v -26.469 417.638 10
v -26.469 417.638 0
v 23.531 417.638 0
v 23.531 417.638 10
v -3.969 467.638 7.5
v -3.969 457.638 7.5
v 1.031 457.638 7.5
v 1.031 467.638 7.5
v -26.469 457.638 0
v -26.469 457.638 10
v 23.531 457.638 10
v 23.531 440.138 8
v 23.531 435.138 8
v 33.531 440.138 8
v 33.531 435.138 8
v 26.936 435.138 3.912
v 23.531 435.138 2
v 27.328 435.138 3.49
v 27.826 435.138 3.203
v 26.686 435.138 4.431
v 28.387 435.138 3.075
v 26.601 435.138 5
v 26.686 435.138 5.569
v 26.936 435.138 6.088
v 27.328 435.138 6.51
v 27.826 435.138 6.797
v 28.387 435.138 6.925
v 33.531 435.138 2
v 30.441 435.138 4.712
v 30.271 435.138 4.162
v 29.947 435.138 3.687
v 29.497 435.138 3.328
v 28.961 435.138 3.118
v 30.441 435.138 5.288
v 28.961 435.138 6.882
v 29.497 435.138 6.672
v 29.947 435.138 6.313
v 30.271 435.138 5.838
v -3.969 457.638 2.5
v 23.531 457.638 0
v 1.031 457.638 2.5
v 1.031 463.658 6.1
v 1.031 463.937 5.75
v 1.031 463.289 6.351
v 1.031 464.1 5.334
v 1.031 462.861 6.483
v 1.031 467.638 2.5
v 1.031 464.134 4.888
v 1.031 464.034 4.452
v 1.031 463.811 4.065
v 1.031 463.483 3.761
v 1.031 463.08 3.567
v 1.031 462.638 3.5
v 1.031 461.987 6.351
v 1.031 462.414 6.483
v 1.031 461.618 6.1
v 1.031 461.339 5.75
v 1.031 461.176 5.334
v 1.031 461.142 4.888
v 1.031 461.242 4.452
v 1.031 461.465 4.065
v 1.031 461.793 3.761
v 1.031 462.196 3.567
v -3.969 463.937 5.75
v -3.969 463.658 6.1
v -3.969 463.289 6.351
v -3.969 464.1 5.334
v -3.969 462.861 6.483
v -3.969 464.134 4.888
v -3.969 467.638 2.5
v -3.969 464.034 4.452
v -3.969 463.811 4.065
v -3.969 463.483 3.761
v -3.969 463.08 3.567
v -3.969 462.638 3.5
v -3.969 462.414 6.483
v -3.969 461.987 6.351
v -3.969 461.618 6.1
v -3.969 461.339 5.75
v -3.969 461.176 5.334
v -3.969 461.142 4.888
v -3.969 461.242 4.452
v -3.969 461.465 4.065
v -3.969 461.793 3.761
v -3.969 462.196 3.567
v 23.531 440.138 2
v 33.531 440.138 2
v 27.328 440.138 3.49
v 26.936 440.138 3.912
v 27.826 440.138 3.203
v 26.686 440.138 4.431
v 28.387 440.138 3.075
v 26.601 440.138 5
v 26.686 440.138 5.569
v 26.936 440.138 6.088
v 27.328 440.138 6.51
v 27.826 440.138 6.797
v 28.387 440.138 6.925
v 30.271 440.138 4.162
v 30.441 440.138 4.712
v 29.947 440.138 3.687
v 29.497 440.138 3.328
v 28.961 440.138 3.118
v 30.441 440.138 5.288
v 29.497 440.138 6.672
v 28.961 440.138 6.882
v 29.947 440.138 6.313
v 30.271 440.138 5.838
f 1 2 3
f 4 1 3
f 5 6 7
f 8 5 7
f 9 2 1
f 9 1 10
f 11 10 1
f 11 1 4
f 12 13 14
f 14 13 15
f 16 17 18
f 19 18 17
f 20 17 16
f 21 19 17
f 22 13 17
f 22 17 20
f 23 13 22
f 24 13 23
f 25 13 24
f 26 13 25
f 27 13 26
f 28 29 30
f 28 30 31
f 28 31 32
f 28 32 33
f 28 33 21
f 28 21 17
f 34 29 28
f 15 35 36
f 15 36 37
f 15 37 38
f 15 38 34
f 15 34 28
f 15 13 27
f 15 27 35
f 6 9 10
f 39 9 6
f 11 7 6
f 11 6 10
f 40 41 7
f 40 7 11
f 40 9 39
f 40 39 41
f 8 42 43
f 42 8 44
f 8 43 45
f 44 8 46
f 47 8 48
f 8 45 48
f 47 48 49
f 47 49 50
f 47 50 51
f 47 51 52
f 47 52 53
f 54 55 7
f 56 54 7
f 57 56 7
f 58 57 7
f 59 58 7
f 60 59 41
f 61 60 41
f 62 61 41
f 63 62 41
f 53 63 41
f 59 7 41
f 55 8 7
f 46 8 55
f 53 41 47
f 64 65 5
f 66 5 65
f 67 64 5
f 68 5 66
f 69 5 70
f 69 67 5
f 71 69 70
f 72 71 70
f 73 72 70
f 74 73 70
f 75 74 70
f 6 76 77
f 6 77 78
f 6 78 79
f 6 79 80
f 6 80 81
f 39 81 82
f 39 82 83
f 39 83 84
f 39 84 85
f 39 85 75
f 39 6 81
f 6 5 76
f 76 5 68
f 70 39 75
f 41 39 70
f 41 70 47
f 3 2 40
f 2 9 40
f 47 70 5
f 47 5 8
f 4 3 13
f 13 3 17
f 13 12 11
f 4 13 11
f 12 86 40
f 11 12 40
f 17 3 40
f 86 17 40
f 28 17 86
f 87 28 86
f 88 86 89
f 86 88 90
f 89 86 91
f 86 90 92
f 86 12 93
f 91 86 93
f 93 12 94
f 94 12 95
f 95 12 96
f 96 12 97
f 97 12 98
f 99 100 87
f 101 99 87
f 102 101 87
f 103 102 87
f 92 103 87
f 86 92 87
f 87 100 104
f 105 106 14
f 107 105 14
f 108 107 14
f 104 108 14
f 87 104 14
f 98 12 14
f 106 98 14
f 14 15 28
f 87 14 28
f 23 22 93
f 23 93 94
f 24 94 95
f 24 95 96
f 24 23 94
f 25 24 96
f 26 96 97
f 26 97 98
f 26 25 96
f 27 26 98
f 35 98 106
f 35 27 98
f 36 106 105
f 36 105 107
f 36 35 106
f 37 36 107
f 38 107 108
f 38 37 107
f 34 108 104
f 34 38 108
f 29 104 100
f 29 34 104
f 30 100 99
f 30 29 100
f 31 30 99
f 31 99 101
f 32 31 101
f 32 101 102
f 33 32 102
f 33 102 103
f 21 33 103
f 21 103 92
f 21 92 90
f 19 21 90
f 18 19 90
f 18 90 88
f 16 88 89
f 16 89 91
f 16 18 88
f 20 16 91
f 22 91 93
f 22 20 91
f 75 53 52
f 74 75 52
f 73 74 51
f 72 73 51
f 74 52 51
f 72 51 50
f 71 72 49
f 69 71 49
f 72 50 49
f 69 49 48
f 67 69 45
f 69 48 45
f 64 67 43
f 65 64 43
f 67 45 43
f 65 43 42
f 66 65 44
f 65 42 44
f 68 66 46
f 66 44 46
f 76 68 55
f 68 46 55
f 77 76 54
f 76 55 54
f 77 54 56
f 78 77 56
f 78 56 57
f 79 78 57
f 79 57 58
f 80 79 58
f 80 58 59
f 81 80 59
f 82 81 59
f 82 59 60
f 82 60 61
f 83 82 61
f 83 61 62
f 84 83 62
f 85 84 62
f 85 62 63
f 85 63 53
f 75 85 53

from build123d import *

# Parameters (mm, degrees)
SKETCH1_W           = 50
SKETCH1_H           = 40
BOSS_EXTRUDE1_DEPTH = 10
SKETCH5_W           = 6
SKETCH5_H           = 5
BOSS_EXTRUDE3_DEPTH = 10
SKETCH6_R           = 2
CUT_EXTRUDE1_DEPTH  = 20
SKETCH8_W           = 10
SKETCH8_H           = 40
CUT_EXTRUDE2_DEPTH  = 25
SKETCH9_W           = 10
SKETCH9_H           = 6
SKETCH9_R           = 1.930897171
BOSS_EXTRUDE4_DEPTH = 5
SKETCH10_W          = 10
SKETCH10_H          = 5
CUT_EXTRUDE3_DEPTH  = 15
SKETCH11_W          = 5
SKETCH11_H          = 5
BOSS_EXTRUDE5_DEPTH = 10
SKETCH12_R          = 1.5
CUT_EXTRUDE4_DEPTH  = 10


with BuildPart() as part:
    # Sketch1 → Boss-Extrude1 (new body)
    with BuildSketch(Plane(origin=(669.84184187, 0, 0), x_dir=(1, 0, 0), z_dir=(0, 0, 1))):
        with Locations((-671.310344828, 437.637931034)):
            Rectangle(SKETCH1_W, SKETCH1_H)
    boss_extrude1 = extrude(amount=BOSS_EXTRUDE1_DEPTH)

    # Sketch5 → Boss-Extrude3 (add)
    with BuildSketch(Plane(origin=(23.531497042, 0, 0), x_dir=(0, 0, -1), z_dir=(1, 0, 0))):
        with Locations((-5, 442.637931034)):
            Rectangle(SKETCH5_W, SKETCH5_H)
        with Locations((-5, 432.637931034)):
            Rectangle(SKETCH5_W, SKETCH5_H)
    extrude(amount=BOSS_EXTRUDE3_DEPTH)

    # Sketch6 → Cut-Extrude1 (cut)
    with BuildSketch(Plane(origin=(669.84184187, 445.137931034, 0), x_dir=(1, 0, 0), z_dir=(0, 1, 0))):
        with Locations(Location((-641.310344828, -5, 0), (0, 0, 180))):
            Circle(SKETCH6_R)
    extrude(amount=-CUT_EXTRUDE1_DEPTH, mode=Mode.SUBTRACT)

    # Sketch8 → Cut-Extrude2 (cut)
    with BuildSketch(Plane.ZY.offset(26.468502958)):
        with Locations((5, 437.637931034)):
            Rectangle(SKETCH8_W, SKETCH8_H)
    extrude(amount=-CUT_EXTRUDE2_DEPTH, mode=Mode.SUBTRACT)

    # Sketch9 → Boss-Extrude4 (add)
    with BuildSketch(Plane(origin=(0, 435.137931034, 0), x_dir=(1, 0, 0), z_dir=(0, 1, 0))):
        with Locations((28.531497042, -5)):
            Rectangle(SKETCH9_W, SKETCH9_H)
        with Locations(Location((28.531497042, -5, 0), (0, 0, 180))):
            Circle(SKETCH9_R, mode=Mode.SUBTRACT)
    extrude(amount=BOSS_EXTRUDE4_DEPTH)

    # Sketch10 → Cut-Extrude3 (cut)
    with BuildSketch(Plane.XY.offset(8)):
        with Locations((28.531497042, 432.637931034)):
            Rectangle(SKETCH10_W, SKETCH10_H)
        with Locations((28.531497042, 442.637931034)):
            Rectangle(SKETCH10_W, SKETCH10_H)
    extrude(amount=-CUT_EXTRUDE3_DEPTH, mode=Mode.SUBTRACT)

    # Mirror1: Boss-Extrude1 across plane
    add(boss_extrude1.mirror(Plane(origin=(-1.468502958, 0, 0), x_dir=(0, 0, 1), z_dir=(1, 0, 0))))

    # Sketch11 → Boss-Extrude5 (add)
    with BuildSketch(Plane(origin=(0, 457.637931034, 0), x_dir=(1, 0, 0), z_dir=(0, 1, 0))):
        with Locations((-1.468502958, -5)):
            Rectangle(SKETCH11_W, SKETCH11_H)
    extrude(amount=BOSS_EXTRUDE5_DEPTH)

    # Sketch12 → Cut-Extrude4 (cut)
    with BuildSketch(Plane(origin=(1.031497042, 0, 0), x_dir=(0, 0, -1), z_dir=(1, 0, 0))):
        with Locations((-5, 462.637931034)):
            Circle(SKETCH12_R)
    extrude(amount=-CUT_EXTRUDE4_DEPTH, mode=Mode.SUBTRACT)


solid = part.part
